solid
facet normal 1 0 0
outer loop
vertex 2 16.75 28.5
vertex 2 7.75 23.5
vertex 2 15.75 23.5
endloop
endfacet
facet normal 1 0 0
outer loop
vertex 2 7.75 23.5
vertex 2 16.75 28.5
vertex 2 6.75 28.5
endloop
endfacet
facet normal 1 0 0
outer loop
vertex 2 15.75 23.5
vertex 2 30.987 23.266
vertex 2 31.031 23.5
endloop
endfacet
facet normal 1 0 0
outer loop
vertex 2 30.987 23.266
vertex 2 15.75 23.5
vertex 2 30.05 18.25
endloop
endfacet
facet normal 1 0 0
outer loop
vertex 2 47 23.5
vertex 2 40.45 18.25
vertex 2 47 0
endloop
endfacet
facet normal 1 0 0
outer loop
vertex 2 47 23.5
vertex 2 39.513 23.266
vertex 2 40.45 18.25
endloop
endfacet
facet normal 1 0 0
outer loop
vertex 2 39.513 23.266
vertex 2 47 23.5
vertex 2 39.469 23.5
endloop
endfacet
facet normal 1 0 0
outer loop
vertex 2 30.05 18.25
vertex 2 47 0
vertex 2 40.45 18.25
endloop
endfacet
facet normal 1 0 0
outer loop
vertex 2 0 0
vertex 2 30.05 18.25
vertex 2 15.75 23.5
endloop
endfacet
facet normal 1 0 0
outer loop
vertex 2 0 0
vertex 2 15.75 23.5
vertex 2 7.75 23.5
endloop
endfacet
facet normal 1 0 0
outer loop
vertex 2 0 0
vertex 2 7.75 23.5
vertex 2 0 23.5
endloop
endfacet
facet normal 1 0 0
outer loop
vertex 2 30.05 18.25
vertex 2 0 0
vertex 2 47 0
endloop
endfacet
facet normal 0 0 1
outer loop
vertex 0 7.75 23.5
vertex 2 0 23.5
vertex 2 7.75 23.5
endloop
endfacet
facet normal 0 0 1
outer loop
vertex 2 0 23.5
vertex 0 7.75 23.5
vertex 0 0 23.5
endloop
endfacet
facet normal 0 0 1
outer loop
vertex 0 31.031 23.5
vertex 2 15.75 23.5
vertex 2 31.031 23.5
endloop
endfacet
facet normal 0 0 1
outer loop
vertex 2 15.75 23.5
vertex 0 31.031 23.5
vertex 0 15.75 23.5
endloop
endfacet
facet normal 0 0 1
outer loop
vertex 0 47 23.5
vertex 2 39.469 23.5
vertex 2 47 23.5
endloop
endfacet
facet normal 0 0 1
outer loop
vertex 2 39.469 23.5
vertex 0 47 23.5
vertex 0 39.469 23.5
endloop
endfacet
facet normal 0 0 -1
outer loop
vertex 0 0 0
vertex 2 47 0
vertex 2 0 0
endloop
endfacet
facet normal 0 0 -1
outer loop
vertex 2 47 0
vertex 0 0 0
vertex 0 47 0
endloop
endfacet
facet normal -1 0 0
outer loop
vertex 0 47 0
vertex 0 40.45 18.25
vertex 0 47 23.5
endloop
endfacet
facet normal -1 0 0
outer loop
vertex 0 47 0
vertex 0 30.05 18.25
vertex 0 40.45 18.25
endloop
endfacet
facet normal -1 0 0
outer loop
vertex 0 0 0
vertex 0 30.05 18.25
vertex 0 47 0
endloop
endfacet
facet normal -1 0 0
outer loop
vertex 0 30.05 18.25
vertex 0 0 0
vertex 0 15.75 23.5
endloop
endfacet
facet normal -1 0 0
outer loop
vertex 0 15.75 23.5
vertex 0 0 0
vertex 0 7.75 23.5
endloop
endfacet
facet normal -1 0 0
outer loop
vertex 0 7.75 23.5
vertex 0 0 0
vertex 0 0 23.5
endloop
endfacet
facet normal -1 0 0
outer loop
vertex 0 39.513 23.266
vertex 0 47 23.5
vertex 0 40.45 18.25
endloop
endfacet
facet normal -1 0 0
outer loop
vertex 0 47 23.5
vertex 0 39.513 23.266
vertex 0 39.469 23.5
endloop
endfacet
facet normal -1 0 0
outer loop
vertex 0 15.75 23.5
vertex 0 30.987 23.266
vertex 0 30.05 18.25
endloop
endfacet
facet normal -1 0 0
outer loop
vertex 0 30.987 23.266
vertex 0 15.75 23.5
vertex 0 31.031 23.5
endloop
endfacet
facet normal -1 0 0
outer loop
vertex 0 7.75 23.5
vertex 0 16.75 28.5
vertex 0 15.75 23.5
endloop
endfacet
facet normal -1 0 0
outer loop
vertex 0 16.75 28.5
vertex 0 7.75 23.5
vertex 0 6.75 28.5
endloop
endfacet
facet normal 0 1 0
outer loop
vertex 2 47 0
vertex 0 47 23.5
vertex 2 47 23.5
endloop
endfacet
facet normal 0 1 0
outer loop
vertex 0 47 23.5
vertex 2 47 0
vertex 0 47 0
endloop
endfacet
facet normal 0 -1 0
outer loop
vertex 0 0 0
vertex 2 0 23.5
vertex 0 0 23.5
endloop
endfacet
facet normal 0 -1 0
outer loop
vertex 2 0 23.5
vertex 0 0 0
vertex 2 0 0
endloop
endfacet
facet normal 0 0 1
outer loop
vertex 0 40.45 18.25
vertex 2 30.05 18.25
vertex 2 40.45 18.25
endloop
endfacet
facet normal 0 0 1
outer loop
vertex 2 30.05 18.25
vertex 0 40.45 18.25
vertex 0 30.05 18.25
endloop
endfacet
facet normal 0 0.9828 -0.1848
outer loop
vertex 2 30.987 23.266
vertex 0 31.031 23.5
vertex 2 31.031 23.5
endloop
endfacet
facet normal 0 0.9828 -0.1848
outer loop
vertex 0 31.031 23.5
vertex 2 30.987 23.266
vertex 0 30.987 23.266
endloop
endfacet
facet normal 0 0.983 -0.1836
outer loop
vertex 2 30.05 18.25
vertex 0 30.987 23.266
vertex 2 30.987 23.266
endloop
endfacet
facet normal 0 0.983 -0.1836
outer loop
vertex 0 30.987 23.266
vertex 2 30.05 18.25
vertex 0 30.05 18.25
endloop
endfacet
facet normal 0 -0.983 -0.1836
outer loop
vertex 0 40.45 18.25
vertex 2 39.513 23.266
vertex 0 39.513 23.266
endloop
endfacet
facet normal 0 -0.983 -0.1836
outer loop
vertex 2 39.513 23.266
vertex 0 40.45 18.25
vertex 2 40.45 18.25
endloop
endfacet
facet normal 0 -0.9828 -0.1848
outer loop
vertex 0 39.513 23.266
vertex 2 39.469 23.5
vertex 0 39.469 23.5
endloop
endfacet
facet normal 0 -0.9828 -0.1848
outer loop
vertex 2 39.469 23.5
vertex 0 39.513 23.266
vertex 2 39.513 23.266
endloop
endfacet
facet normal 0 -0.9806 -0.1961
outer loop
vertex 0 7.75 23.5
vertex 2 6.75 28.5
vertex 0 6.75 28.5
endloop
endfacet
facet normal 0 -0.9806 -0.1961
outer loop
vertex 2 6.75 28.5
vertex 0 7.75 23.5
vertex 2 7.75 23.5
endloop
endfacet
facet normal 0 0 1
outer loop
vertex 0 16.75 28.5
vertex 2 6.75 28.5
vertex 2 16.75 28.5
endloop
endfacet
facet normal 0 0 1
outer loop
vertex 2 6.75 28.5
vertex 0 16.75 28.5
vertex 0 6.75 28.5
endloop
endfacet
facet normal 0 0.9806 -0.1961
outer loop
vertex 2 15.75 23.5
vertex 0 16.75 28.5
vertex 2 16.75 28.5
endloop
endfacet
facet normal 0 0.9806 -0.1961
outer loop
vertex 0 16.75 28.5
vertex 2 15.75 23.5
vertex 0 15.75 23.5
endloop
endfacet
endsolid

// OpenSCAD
// dovetail_test.scad — 1壁面スケッチ（逆台形キー付き）
// ブランチ: feature/dovetail-slide
//
// 左壁1面のみ。合わせ面（Z=HALF_H）に逆台形の凸・凹を配置。

$fn = 32;

/* ─── 寸法（本体と共通）─── */
WALL   = 2.0;
HALF_H = 23.5;
WALL_Y = 47.0;   // 壁の奥行き（OUTER_D）

/* ─── 逆台形キーのパラメータ ─── */
KEY_BASE = 8.0;   // 根元幅（合わせ面側・狭い）
KEY_TIP  = 10.0;  // 先端幅（広い）
KEY_NORM = WALL;  // 法線方向（壁厚と同じ）
KEY_H    = 5.0;   // 凸の高さ

SOCK_CLEAR = 0.2;           // 片側クリアランス
SOCK_H     = KEY_H + 0.25;  // 凹の深さ

/* ─── 逆台形 凸（根元狭・先端広）─── */
module key_bump() {
    linear_extrude(height = KEY_H, scale = [KEY_TIP / KEY_BASE, 1])
        square([KEY_BASE, KEY_NORM], center = true);
}

/* ─── 逆台形 凹（開口狭・奥広）─── */
// linear_extrude は「底面 → 上面」の向きで scale が効く。
// 奥（Z=-SOCK_H）に広い deep_w を置き、上面（Z=0、合わせ面）で open_w に絞る。
module key_socket() {
    open_w = KEY_BASE + 2 * SOCK_CLEAR;  // 開口幅 = 根元幅 + クリア（狭い）
    deep_w = KEY_TIP  + 2 * SOCK_CLEAR;  // 奥幅   = 先端幅 + クリア（広い）
    translate([0, 0, -SOCK_H])
        linear_extrude(height = SOCK_H + 0.1, scale = [open_w / deep_w, 1])
            square([deep_w, KEY_NORM], center = true);
}

/* ─── 壁1面（左壁）─── */
module one_wall() {
    difference() {
        // 壁本体
        cube([WALL, WALL_Y, HALF_H]);

        // 凹（合わせ面 Z=HALF_H に開口）
        translate([WALL / 2, WALL_Y * 3/4, HALF_H])
            rotate([0, 0, 90])
                key_socket();
    }

    // 凸（合わせ面 Z=HALF_H から突出）
    translate([WALL / 2, WALL_Y / 4, HALF_H])
        rotate([0, 0, 90])
            key_bump();
}

one_wall();

echo(str("逆台形キー: 根元 ", KEY_BASE, " mm → 先端 ", KEY_TIP, " mm / 高さ ", KEY_H, " mm"));
echo(str("凹: 開口 ", KEY_BASE + 2*SOCK_CLEAR, " mm（狭）→ 奥 ", KEY_TIP + 2*SOCK_CLEAR, " mm（広）/ 深さ ", SOCK_H, " mm"));
echo("※ 凹み形状が逆台形（開口狭・奥広）→ Z方向には抜けない（アンダーカット）");
